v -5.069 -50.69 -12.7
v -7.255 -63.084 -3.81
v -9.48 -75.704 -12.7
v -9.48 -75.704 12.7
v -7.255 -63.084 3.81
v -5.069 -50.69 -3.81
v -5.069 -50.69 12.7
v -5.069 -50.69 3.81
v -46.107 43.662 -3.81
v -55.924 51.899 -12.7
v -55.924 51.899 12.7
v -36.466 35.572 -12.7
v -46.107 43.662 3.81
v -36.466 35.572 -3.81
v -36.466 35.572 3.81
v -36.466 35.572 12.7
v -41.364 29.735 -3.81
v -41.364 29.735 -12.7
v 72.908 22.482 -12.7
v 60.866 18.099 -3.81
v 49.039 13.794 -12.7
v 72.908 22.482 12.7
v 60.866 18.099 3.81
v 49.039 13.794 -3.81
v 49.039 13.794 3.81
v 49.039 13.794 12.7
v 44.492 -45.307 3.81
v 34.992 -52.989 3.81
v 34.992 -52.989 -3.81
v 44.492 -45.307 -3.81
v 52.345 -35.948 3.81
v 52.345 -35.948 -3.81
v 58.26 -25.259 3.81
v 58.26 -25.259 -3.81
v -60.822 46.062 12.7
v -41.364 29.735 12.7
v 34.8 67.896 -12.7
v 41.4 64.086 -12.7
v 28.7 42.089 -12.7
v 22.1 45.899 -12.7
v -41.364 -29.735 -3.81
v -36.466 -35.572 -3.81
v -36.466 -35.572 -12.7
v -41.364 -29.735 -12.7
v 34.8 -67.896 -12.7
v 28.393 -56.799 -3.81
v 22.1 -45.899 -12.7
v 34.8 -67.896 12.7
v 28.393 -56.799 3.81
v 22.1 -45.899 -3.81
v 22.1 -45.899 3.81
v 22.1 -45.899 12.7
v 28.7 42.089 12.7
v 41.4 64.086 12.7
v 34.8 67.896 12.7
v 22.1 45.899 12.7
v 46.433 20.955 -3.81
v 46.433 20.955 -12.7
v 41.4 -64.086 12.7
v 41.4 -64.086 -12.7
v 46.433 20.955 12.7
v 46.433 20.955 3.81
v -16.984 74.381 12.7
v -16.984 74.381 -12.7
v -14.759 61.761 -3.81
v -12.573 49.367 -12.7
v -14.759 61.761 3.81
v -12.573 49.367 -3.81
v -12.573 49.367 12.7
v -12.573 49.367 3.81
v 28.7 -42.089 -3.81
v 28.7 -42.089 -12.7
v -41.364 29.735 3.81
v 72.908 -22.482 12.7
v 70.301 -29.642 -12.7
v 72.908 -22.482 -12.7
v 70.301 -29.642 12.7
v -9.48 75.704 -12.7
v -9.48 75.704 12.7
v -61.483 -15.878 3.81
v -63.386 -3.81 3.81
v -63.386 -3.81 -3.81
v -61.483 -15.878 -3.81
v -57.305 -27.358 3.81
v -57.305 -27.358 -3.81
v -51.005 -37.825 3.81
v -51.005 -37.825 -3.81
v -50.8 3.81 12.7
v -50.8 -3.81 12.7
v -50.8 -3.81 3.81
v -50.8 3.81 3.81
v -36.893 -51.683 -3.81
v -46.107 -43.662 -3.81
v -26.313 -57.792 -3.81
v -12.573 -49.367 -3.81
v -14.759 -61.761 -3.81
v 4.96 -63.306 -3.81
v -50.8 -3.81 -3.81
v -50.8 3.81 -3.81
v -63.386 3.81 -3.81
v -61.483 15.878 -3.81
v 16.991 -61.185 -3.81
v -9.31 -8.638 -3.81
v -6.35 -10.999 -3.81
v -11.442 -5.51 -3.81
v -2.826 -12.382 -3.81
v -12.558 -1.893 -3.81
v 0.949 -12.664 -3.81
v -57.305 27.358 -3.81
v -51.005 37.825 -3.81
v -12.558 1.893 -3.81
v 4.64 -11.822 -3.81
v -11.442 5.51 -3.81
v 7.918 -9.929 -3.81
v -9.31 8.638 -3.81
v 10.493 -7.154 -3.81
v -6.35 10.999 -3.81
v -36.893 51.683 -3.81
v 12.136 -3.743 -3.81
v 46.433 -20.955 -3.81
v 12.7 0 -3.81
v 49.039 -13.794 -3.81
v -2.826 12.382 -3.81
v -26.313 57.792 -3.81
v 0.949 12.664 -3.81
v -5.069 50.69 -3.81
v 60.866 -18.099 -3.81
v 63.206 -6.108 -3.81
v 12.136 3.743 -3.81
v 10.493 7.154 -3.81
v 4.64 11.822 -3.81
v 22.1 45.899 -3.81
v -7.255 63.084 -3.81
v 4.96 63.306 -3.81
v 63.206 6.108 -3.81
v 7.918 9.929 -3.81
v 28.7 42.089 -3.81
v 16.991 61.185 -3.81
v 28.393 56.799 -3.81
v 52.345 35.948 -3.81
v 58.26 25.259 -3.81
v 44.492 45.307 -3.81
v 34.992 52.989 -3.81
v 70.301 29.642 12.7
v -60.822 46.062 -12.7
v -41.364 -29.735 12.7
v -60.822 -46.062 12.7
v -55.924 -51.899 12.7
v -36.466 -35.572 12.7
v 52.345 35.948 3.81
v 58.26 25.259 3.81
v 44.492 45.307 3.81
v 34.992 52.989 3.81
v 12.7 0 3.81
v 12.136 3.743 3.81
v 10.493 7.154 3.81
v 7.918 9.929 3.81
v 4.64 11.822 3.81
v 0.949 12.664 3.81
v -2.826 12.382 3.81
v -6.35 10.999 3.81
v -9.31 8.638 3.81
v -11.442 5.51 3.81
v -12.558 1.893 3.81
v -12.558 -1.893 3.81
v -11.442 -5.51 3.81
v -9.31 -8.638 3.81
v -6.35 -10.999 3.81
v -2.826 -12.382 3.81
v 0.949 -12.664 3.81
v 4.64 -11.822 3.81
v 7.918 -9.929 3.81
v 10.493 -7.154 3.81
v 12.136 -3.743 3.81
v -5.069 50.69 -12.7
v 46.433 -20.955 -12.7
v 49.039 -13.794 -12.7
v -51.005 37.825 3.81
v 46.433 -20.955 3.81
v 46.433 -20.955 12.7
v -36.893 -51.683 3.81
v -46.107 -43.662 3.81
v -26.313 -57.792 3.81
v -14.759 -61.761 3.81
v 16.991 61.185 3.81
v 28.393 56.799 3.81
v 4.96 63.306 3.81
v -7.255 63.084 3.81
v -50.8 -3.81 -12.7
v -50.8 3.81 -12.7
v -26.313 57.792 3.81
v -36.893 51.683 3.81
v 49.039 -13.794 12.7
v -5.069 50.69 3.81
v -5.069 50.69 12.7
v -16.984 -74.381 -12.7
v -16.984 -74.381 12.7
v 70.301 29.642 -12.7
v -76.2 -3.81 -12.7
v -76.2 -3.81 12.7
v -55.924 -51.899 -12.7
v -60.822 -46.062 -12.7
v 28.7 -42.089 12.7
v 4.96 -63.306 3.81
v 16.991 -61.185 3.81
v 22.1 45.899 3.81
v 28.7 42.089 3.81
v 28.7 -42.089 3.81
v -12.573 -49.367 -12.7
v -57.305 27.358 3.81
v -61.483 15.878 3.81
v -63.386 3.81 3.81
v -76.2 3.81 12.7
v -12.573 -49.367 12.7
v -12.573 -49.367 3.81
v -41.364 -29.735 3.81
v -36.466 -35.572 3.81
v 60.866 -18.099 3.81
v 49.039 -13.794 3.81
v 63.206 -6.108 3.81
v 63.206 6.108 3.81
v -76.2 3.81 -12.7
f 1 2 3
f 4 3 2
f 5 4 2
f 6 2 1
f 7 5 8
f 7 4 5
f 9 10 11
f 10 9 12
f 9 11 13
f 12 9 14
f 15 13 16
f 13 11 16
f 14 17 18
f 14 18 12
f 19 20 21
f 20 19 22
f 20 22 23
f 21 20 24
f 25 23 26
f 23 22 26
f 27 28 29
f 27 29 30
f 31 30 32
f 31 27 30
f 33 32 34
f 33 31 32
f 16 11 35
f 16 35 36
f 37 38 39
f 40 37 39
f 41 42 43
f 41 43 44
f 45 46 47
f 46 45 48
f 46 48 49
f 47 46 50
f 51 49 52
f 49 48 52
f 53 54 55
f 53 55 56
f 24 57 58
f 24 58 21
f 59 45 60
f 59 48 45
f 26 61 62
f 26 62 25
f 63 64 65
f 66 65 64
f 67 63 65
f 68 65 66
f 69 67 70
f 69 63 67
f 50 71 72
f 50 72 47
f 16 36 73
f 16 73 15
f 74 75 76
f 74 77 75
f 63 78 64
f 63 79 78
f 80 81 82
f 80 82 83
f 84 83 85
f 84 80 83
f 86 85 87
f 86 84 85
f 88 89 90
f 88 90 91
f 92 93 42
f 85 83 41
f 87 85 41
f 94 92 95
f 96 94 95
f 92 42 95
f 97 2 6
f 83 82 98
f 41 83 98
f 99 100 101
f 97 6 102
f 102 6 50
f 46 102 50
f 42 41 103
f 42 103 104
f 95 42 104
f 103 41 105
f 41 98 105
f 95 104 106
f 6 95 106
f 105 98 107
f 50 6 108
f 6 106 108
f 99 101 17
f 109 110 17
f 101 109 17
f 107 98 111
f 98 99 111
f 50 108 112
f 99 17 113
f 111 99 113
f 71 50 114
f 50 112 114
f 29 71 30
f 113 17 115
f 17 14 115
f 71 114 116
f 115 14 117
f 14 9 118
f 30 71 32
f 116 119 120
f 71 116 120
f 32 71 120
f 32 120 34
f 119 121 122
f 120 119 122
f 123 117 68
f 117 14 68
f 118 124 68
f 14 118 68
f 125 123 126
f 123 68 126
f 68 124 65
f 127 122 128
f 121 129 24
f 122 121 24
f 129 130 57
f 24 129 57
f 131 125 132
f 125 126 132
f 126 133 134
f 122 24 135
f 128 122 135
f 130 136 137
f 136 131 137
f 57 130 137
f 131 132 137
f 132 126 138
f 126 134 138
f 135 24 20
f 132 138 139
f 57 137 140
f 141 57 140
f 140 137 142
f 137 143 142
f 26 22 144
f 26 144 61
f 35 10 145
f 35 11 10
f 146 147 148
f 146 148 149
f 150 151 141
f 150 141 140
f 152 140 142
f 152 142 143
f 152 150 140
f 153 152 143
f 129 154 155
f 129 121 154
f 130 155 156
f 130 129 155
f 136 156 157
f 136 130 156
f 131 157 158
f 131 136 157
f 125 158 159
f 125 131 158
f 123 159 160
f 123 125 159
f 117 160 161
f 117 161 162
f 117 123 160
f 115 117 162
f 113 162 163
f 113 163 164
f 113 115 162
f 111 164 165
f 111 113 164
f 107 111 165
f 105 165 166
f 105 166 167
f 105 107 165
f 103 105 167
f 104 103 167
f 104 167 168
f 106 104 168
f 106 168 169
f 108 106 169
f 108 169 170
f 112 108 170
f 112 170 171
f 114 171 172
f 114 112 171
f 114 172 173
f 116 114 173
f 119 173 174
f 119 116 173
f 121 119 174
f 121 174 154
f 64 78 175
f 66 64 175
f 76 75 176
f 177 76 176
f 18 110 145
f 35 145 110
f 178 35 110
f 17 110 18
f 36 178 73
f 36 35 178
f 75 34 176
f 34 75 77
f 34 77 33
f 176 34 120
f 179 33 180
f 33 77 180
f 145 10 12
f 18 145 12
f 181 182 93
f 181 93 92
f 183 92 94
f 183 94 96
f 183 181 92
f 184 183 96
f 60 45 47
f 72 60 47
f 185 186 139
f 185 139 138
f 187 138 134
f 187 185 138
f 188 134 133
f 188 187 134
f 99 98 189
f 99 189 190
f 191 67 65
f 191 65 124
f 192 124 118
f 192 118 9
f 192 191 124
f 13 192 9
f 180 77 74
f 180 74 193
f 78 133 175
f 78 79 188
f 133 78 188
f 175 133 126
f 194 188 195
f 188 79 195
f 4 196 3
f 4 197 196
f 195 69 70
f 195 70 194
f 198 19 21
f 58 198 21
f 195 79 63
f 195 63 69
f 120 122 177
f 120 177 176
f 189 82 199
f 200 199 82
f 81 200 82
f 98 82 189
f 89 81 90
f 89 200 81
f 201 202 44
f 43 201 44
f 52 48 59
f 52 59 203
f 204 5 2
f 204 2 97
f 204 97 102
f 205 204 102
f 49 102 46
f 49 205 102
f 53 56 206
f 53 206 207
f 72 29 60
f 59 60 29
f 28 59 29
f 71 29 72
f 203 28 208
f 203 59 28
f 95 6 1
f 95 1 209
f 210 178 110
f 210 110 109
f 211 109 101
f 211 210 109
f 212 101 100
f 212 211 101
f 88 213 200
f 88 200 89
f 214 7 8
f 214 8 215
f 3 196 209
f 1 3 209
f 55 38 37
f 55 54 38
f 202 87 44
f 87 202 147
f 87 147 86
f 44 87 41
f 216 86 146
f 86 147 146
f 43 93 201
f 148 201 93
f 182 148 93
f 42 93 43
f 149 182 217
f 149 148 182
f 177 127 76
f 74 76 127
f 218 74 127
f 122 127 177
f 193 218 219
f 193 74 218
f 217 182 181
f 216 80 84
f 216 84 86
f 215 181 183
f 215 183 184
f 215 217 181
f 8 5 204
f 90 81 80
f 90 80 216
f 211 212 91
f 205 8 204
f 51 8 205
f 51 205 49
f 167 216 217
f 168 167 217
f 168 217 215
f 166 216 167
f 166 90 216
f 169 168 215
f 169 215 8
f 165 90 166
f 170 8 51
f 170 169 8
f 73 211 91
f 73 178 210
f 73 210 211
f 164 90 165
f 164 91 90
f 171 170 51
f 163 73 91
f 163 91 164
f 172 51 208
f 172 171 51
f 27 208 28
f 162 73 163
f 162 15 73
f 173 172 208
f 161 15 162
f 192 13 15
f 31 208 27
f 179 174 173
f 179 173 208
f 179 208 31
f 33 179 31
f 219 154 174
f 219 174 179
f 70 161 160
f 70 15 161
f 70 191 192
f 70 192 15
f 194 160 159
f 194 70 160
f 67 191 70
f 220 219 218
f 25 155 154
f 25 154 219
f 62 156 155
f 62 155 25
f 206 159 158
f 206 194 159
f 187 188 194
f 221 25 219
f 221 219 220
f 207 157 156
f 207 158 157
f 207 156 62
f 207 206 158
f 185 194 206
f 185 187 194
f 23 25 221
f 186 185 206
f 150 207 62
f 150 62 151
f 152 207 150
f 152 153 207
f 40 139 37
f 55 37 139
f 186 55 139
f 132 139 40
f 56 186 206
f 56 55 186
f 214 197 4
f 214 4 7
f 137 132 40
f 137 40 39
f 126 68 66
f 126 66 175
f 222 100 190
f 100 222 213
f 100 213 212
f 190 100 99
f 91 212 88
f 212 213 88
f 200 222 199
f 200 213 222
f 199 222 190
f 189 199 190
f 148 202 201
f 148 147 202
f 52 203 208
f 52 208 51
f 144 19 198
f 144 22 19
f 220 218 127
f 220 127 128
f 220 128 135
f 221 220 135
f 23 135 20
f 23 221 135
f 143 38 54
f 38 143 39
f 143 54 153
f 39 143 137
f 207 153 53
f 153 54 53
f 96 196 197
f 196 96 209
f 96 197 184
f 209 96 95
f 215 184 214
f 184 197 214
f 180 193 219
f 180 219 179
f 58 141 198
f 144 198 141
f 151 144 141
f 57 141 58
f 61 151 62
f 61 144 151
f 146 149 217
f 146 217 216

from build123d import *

# Parameters (mm, degrees)
F0_R            = 63.5
F0_R_2          = 12.7
F2_DEPTH        = 3.81
F1_W            = 25.4
F1_H            = 3.81
F3_DEPTH        = 12.7
F3_COPIES_COUNT = 9


# Not quite as in the source:
# - a pattern or mirror of a feature is missing from the dataset's text; its kind, count and spacing are read off the source's solid


with BuildPart() as f2:
    # F0 (on Top) → F2 (new body, symmetric)
    with BuildSketch(Plane.XY):
        Circle(F0_R)
        Circle(F0_R_2, mode=Mode.SUBTRACT)
    extrude(amount=F2_DEPTH, both=True)

    # F1 (on Top) → F3 (join, symmetric)
    with BuildSketch(Plane.XY):
        with Locations((-63.5, 1.905)):
            Rectangle(F1_W, F1_H)
        with Locations((-63.5, -1.905)):
            Rectangle(F1_W, F1_H)
    f3 = extrude(amount=F3_DEPTH, both=True)

    # F3_copies: F3 ×9 about axis
    f3_copies_axis = Axis((0, 0, 0), (0, 0, 1))
    for i in range(1, F3_COPIES_COUNT):
        add(f3.rotate(f3_copies_axis, i * 360 / F3_COPIES_COUNT))


solid = f2.part
